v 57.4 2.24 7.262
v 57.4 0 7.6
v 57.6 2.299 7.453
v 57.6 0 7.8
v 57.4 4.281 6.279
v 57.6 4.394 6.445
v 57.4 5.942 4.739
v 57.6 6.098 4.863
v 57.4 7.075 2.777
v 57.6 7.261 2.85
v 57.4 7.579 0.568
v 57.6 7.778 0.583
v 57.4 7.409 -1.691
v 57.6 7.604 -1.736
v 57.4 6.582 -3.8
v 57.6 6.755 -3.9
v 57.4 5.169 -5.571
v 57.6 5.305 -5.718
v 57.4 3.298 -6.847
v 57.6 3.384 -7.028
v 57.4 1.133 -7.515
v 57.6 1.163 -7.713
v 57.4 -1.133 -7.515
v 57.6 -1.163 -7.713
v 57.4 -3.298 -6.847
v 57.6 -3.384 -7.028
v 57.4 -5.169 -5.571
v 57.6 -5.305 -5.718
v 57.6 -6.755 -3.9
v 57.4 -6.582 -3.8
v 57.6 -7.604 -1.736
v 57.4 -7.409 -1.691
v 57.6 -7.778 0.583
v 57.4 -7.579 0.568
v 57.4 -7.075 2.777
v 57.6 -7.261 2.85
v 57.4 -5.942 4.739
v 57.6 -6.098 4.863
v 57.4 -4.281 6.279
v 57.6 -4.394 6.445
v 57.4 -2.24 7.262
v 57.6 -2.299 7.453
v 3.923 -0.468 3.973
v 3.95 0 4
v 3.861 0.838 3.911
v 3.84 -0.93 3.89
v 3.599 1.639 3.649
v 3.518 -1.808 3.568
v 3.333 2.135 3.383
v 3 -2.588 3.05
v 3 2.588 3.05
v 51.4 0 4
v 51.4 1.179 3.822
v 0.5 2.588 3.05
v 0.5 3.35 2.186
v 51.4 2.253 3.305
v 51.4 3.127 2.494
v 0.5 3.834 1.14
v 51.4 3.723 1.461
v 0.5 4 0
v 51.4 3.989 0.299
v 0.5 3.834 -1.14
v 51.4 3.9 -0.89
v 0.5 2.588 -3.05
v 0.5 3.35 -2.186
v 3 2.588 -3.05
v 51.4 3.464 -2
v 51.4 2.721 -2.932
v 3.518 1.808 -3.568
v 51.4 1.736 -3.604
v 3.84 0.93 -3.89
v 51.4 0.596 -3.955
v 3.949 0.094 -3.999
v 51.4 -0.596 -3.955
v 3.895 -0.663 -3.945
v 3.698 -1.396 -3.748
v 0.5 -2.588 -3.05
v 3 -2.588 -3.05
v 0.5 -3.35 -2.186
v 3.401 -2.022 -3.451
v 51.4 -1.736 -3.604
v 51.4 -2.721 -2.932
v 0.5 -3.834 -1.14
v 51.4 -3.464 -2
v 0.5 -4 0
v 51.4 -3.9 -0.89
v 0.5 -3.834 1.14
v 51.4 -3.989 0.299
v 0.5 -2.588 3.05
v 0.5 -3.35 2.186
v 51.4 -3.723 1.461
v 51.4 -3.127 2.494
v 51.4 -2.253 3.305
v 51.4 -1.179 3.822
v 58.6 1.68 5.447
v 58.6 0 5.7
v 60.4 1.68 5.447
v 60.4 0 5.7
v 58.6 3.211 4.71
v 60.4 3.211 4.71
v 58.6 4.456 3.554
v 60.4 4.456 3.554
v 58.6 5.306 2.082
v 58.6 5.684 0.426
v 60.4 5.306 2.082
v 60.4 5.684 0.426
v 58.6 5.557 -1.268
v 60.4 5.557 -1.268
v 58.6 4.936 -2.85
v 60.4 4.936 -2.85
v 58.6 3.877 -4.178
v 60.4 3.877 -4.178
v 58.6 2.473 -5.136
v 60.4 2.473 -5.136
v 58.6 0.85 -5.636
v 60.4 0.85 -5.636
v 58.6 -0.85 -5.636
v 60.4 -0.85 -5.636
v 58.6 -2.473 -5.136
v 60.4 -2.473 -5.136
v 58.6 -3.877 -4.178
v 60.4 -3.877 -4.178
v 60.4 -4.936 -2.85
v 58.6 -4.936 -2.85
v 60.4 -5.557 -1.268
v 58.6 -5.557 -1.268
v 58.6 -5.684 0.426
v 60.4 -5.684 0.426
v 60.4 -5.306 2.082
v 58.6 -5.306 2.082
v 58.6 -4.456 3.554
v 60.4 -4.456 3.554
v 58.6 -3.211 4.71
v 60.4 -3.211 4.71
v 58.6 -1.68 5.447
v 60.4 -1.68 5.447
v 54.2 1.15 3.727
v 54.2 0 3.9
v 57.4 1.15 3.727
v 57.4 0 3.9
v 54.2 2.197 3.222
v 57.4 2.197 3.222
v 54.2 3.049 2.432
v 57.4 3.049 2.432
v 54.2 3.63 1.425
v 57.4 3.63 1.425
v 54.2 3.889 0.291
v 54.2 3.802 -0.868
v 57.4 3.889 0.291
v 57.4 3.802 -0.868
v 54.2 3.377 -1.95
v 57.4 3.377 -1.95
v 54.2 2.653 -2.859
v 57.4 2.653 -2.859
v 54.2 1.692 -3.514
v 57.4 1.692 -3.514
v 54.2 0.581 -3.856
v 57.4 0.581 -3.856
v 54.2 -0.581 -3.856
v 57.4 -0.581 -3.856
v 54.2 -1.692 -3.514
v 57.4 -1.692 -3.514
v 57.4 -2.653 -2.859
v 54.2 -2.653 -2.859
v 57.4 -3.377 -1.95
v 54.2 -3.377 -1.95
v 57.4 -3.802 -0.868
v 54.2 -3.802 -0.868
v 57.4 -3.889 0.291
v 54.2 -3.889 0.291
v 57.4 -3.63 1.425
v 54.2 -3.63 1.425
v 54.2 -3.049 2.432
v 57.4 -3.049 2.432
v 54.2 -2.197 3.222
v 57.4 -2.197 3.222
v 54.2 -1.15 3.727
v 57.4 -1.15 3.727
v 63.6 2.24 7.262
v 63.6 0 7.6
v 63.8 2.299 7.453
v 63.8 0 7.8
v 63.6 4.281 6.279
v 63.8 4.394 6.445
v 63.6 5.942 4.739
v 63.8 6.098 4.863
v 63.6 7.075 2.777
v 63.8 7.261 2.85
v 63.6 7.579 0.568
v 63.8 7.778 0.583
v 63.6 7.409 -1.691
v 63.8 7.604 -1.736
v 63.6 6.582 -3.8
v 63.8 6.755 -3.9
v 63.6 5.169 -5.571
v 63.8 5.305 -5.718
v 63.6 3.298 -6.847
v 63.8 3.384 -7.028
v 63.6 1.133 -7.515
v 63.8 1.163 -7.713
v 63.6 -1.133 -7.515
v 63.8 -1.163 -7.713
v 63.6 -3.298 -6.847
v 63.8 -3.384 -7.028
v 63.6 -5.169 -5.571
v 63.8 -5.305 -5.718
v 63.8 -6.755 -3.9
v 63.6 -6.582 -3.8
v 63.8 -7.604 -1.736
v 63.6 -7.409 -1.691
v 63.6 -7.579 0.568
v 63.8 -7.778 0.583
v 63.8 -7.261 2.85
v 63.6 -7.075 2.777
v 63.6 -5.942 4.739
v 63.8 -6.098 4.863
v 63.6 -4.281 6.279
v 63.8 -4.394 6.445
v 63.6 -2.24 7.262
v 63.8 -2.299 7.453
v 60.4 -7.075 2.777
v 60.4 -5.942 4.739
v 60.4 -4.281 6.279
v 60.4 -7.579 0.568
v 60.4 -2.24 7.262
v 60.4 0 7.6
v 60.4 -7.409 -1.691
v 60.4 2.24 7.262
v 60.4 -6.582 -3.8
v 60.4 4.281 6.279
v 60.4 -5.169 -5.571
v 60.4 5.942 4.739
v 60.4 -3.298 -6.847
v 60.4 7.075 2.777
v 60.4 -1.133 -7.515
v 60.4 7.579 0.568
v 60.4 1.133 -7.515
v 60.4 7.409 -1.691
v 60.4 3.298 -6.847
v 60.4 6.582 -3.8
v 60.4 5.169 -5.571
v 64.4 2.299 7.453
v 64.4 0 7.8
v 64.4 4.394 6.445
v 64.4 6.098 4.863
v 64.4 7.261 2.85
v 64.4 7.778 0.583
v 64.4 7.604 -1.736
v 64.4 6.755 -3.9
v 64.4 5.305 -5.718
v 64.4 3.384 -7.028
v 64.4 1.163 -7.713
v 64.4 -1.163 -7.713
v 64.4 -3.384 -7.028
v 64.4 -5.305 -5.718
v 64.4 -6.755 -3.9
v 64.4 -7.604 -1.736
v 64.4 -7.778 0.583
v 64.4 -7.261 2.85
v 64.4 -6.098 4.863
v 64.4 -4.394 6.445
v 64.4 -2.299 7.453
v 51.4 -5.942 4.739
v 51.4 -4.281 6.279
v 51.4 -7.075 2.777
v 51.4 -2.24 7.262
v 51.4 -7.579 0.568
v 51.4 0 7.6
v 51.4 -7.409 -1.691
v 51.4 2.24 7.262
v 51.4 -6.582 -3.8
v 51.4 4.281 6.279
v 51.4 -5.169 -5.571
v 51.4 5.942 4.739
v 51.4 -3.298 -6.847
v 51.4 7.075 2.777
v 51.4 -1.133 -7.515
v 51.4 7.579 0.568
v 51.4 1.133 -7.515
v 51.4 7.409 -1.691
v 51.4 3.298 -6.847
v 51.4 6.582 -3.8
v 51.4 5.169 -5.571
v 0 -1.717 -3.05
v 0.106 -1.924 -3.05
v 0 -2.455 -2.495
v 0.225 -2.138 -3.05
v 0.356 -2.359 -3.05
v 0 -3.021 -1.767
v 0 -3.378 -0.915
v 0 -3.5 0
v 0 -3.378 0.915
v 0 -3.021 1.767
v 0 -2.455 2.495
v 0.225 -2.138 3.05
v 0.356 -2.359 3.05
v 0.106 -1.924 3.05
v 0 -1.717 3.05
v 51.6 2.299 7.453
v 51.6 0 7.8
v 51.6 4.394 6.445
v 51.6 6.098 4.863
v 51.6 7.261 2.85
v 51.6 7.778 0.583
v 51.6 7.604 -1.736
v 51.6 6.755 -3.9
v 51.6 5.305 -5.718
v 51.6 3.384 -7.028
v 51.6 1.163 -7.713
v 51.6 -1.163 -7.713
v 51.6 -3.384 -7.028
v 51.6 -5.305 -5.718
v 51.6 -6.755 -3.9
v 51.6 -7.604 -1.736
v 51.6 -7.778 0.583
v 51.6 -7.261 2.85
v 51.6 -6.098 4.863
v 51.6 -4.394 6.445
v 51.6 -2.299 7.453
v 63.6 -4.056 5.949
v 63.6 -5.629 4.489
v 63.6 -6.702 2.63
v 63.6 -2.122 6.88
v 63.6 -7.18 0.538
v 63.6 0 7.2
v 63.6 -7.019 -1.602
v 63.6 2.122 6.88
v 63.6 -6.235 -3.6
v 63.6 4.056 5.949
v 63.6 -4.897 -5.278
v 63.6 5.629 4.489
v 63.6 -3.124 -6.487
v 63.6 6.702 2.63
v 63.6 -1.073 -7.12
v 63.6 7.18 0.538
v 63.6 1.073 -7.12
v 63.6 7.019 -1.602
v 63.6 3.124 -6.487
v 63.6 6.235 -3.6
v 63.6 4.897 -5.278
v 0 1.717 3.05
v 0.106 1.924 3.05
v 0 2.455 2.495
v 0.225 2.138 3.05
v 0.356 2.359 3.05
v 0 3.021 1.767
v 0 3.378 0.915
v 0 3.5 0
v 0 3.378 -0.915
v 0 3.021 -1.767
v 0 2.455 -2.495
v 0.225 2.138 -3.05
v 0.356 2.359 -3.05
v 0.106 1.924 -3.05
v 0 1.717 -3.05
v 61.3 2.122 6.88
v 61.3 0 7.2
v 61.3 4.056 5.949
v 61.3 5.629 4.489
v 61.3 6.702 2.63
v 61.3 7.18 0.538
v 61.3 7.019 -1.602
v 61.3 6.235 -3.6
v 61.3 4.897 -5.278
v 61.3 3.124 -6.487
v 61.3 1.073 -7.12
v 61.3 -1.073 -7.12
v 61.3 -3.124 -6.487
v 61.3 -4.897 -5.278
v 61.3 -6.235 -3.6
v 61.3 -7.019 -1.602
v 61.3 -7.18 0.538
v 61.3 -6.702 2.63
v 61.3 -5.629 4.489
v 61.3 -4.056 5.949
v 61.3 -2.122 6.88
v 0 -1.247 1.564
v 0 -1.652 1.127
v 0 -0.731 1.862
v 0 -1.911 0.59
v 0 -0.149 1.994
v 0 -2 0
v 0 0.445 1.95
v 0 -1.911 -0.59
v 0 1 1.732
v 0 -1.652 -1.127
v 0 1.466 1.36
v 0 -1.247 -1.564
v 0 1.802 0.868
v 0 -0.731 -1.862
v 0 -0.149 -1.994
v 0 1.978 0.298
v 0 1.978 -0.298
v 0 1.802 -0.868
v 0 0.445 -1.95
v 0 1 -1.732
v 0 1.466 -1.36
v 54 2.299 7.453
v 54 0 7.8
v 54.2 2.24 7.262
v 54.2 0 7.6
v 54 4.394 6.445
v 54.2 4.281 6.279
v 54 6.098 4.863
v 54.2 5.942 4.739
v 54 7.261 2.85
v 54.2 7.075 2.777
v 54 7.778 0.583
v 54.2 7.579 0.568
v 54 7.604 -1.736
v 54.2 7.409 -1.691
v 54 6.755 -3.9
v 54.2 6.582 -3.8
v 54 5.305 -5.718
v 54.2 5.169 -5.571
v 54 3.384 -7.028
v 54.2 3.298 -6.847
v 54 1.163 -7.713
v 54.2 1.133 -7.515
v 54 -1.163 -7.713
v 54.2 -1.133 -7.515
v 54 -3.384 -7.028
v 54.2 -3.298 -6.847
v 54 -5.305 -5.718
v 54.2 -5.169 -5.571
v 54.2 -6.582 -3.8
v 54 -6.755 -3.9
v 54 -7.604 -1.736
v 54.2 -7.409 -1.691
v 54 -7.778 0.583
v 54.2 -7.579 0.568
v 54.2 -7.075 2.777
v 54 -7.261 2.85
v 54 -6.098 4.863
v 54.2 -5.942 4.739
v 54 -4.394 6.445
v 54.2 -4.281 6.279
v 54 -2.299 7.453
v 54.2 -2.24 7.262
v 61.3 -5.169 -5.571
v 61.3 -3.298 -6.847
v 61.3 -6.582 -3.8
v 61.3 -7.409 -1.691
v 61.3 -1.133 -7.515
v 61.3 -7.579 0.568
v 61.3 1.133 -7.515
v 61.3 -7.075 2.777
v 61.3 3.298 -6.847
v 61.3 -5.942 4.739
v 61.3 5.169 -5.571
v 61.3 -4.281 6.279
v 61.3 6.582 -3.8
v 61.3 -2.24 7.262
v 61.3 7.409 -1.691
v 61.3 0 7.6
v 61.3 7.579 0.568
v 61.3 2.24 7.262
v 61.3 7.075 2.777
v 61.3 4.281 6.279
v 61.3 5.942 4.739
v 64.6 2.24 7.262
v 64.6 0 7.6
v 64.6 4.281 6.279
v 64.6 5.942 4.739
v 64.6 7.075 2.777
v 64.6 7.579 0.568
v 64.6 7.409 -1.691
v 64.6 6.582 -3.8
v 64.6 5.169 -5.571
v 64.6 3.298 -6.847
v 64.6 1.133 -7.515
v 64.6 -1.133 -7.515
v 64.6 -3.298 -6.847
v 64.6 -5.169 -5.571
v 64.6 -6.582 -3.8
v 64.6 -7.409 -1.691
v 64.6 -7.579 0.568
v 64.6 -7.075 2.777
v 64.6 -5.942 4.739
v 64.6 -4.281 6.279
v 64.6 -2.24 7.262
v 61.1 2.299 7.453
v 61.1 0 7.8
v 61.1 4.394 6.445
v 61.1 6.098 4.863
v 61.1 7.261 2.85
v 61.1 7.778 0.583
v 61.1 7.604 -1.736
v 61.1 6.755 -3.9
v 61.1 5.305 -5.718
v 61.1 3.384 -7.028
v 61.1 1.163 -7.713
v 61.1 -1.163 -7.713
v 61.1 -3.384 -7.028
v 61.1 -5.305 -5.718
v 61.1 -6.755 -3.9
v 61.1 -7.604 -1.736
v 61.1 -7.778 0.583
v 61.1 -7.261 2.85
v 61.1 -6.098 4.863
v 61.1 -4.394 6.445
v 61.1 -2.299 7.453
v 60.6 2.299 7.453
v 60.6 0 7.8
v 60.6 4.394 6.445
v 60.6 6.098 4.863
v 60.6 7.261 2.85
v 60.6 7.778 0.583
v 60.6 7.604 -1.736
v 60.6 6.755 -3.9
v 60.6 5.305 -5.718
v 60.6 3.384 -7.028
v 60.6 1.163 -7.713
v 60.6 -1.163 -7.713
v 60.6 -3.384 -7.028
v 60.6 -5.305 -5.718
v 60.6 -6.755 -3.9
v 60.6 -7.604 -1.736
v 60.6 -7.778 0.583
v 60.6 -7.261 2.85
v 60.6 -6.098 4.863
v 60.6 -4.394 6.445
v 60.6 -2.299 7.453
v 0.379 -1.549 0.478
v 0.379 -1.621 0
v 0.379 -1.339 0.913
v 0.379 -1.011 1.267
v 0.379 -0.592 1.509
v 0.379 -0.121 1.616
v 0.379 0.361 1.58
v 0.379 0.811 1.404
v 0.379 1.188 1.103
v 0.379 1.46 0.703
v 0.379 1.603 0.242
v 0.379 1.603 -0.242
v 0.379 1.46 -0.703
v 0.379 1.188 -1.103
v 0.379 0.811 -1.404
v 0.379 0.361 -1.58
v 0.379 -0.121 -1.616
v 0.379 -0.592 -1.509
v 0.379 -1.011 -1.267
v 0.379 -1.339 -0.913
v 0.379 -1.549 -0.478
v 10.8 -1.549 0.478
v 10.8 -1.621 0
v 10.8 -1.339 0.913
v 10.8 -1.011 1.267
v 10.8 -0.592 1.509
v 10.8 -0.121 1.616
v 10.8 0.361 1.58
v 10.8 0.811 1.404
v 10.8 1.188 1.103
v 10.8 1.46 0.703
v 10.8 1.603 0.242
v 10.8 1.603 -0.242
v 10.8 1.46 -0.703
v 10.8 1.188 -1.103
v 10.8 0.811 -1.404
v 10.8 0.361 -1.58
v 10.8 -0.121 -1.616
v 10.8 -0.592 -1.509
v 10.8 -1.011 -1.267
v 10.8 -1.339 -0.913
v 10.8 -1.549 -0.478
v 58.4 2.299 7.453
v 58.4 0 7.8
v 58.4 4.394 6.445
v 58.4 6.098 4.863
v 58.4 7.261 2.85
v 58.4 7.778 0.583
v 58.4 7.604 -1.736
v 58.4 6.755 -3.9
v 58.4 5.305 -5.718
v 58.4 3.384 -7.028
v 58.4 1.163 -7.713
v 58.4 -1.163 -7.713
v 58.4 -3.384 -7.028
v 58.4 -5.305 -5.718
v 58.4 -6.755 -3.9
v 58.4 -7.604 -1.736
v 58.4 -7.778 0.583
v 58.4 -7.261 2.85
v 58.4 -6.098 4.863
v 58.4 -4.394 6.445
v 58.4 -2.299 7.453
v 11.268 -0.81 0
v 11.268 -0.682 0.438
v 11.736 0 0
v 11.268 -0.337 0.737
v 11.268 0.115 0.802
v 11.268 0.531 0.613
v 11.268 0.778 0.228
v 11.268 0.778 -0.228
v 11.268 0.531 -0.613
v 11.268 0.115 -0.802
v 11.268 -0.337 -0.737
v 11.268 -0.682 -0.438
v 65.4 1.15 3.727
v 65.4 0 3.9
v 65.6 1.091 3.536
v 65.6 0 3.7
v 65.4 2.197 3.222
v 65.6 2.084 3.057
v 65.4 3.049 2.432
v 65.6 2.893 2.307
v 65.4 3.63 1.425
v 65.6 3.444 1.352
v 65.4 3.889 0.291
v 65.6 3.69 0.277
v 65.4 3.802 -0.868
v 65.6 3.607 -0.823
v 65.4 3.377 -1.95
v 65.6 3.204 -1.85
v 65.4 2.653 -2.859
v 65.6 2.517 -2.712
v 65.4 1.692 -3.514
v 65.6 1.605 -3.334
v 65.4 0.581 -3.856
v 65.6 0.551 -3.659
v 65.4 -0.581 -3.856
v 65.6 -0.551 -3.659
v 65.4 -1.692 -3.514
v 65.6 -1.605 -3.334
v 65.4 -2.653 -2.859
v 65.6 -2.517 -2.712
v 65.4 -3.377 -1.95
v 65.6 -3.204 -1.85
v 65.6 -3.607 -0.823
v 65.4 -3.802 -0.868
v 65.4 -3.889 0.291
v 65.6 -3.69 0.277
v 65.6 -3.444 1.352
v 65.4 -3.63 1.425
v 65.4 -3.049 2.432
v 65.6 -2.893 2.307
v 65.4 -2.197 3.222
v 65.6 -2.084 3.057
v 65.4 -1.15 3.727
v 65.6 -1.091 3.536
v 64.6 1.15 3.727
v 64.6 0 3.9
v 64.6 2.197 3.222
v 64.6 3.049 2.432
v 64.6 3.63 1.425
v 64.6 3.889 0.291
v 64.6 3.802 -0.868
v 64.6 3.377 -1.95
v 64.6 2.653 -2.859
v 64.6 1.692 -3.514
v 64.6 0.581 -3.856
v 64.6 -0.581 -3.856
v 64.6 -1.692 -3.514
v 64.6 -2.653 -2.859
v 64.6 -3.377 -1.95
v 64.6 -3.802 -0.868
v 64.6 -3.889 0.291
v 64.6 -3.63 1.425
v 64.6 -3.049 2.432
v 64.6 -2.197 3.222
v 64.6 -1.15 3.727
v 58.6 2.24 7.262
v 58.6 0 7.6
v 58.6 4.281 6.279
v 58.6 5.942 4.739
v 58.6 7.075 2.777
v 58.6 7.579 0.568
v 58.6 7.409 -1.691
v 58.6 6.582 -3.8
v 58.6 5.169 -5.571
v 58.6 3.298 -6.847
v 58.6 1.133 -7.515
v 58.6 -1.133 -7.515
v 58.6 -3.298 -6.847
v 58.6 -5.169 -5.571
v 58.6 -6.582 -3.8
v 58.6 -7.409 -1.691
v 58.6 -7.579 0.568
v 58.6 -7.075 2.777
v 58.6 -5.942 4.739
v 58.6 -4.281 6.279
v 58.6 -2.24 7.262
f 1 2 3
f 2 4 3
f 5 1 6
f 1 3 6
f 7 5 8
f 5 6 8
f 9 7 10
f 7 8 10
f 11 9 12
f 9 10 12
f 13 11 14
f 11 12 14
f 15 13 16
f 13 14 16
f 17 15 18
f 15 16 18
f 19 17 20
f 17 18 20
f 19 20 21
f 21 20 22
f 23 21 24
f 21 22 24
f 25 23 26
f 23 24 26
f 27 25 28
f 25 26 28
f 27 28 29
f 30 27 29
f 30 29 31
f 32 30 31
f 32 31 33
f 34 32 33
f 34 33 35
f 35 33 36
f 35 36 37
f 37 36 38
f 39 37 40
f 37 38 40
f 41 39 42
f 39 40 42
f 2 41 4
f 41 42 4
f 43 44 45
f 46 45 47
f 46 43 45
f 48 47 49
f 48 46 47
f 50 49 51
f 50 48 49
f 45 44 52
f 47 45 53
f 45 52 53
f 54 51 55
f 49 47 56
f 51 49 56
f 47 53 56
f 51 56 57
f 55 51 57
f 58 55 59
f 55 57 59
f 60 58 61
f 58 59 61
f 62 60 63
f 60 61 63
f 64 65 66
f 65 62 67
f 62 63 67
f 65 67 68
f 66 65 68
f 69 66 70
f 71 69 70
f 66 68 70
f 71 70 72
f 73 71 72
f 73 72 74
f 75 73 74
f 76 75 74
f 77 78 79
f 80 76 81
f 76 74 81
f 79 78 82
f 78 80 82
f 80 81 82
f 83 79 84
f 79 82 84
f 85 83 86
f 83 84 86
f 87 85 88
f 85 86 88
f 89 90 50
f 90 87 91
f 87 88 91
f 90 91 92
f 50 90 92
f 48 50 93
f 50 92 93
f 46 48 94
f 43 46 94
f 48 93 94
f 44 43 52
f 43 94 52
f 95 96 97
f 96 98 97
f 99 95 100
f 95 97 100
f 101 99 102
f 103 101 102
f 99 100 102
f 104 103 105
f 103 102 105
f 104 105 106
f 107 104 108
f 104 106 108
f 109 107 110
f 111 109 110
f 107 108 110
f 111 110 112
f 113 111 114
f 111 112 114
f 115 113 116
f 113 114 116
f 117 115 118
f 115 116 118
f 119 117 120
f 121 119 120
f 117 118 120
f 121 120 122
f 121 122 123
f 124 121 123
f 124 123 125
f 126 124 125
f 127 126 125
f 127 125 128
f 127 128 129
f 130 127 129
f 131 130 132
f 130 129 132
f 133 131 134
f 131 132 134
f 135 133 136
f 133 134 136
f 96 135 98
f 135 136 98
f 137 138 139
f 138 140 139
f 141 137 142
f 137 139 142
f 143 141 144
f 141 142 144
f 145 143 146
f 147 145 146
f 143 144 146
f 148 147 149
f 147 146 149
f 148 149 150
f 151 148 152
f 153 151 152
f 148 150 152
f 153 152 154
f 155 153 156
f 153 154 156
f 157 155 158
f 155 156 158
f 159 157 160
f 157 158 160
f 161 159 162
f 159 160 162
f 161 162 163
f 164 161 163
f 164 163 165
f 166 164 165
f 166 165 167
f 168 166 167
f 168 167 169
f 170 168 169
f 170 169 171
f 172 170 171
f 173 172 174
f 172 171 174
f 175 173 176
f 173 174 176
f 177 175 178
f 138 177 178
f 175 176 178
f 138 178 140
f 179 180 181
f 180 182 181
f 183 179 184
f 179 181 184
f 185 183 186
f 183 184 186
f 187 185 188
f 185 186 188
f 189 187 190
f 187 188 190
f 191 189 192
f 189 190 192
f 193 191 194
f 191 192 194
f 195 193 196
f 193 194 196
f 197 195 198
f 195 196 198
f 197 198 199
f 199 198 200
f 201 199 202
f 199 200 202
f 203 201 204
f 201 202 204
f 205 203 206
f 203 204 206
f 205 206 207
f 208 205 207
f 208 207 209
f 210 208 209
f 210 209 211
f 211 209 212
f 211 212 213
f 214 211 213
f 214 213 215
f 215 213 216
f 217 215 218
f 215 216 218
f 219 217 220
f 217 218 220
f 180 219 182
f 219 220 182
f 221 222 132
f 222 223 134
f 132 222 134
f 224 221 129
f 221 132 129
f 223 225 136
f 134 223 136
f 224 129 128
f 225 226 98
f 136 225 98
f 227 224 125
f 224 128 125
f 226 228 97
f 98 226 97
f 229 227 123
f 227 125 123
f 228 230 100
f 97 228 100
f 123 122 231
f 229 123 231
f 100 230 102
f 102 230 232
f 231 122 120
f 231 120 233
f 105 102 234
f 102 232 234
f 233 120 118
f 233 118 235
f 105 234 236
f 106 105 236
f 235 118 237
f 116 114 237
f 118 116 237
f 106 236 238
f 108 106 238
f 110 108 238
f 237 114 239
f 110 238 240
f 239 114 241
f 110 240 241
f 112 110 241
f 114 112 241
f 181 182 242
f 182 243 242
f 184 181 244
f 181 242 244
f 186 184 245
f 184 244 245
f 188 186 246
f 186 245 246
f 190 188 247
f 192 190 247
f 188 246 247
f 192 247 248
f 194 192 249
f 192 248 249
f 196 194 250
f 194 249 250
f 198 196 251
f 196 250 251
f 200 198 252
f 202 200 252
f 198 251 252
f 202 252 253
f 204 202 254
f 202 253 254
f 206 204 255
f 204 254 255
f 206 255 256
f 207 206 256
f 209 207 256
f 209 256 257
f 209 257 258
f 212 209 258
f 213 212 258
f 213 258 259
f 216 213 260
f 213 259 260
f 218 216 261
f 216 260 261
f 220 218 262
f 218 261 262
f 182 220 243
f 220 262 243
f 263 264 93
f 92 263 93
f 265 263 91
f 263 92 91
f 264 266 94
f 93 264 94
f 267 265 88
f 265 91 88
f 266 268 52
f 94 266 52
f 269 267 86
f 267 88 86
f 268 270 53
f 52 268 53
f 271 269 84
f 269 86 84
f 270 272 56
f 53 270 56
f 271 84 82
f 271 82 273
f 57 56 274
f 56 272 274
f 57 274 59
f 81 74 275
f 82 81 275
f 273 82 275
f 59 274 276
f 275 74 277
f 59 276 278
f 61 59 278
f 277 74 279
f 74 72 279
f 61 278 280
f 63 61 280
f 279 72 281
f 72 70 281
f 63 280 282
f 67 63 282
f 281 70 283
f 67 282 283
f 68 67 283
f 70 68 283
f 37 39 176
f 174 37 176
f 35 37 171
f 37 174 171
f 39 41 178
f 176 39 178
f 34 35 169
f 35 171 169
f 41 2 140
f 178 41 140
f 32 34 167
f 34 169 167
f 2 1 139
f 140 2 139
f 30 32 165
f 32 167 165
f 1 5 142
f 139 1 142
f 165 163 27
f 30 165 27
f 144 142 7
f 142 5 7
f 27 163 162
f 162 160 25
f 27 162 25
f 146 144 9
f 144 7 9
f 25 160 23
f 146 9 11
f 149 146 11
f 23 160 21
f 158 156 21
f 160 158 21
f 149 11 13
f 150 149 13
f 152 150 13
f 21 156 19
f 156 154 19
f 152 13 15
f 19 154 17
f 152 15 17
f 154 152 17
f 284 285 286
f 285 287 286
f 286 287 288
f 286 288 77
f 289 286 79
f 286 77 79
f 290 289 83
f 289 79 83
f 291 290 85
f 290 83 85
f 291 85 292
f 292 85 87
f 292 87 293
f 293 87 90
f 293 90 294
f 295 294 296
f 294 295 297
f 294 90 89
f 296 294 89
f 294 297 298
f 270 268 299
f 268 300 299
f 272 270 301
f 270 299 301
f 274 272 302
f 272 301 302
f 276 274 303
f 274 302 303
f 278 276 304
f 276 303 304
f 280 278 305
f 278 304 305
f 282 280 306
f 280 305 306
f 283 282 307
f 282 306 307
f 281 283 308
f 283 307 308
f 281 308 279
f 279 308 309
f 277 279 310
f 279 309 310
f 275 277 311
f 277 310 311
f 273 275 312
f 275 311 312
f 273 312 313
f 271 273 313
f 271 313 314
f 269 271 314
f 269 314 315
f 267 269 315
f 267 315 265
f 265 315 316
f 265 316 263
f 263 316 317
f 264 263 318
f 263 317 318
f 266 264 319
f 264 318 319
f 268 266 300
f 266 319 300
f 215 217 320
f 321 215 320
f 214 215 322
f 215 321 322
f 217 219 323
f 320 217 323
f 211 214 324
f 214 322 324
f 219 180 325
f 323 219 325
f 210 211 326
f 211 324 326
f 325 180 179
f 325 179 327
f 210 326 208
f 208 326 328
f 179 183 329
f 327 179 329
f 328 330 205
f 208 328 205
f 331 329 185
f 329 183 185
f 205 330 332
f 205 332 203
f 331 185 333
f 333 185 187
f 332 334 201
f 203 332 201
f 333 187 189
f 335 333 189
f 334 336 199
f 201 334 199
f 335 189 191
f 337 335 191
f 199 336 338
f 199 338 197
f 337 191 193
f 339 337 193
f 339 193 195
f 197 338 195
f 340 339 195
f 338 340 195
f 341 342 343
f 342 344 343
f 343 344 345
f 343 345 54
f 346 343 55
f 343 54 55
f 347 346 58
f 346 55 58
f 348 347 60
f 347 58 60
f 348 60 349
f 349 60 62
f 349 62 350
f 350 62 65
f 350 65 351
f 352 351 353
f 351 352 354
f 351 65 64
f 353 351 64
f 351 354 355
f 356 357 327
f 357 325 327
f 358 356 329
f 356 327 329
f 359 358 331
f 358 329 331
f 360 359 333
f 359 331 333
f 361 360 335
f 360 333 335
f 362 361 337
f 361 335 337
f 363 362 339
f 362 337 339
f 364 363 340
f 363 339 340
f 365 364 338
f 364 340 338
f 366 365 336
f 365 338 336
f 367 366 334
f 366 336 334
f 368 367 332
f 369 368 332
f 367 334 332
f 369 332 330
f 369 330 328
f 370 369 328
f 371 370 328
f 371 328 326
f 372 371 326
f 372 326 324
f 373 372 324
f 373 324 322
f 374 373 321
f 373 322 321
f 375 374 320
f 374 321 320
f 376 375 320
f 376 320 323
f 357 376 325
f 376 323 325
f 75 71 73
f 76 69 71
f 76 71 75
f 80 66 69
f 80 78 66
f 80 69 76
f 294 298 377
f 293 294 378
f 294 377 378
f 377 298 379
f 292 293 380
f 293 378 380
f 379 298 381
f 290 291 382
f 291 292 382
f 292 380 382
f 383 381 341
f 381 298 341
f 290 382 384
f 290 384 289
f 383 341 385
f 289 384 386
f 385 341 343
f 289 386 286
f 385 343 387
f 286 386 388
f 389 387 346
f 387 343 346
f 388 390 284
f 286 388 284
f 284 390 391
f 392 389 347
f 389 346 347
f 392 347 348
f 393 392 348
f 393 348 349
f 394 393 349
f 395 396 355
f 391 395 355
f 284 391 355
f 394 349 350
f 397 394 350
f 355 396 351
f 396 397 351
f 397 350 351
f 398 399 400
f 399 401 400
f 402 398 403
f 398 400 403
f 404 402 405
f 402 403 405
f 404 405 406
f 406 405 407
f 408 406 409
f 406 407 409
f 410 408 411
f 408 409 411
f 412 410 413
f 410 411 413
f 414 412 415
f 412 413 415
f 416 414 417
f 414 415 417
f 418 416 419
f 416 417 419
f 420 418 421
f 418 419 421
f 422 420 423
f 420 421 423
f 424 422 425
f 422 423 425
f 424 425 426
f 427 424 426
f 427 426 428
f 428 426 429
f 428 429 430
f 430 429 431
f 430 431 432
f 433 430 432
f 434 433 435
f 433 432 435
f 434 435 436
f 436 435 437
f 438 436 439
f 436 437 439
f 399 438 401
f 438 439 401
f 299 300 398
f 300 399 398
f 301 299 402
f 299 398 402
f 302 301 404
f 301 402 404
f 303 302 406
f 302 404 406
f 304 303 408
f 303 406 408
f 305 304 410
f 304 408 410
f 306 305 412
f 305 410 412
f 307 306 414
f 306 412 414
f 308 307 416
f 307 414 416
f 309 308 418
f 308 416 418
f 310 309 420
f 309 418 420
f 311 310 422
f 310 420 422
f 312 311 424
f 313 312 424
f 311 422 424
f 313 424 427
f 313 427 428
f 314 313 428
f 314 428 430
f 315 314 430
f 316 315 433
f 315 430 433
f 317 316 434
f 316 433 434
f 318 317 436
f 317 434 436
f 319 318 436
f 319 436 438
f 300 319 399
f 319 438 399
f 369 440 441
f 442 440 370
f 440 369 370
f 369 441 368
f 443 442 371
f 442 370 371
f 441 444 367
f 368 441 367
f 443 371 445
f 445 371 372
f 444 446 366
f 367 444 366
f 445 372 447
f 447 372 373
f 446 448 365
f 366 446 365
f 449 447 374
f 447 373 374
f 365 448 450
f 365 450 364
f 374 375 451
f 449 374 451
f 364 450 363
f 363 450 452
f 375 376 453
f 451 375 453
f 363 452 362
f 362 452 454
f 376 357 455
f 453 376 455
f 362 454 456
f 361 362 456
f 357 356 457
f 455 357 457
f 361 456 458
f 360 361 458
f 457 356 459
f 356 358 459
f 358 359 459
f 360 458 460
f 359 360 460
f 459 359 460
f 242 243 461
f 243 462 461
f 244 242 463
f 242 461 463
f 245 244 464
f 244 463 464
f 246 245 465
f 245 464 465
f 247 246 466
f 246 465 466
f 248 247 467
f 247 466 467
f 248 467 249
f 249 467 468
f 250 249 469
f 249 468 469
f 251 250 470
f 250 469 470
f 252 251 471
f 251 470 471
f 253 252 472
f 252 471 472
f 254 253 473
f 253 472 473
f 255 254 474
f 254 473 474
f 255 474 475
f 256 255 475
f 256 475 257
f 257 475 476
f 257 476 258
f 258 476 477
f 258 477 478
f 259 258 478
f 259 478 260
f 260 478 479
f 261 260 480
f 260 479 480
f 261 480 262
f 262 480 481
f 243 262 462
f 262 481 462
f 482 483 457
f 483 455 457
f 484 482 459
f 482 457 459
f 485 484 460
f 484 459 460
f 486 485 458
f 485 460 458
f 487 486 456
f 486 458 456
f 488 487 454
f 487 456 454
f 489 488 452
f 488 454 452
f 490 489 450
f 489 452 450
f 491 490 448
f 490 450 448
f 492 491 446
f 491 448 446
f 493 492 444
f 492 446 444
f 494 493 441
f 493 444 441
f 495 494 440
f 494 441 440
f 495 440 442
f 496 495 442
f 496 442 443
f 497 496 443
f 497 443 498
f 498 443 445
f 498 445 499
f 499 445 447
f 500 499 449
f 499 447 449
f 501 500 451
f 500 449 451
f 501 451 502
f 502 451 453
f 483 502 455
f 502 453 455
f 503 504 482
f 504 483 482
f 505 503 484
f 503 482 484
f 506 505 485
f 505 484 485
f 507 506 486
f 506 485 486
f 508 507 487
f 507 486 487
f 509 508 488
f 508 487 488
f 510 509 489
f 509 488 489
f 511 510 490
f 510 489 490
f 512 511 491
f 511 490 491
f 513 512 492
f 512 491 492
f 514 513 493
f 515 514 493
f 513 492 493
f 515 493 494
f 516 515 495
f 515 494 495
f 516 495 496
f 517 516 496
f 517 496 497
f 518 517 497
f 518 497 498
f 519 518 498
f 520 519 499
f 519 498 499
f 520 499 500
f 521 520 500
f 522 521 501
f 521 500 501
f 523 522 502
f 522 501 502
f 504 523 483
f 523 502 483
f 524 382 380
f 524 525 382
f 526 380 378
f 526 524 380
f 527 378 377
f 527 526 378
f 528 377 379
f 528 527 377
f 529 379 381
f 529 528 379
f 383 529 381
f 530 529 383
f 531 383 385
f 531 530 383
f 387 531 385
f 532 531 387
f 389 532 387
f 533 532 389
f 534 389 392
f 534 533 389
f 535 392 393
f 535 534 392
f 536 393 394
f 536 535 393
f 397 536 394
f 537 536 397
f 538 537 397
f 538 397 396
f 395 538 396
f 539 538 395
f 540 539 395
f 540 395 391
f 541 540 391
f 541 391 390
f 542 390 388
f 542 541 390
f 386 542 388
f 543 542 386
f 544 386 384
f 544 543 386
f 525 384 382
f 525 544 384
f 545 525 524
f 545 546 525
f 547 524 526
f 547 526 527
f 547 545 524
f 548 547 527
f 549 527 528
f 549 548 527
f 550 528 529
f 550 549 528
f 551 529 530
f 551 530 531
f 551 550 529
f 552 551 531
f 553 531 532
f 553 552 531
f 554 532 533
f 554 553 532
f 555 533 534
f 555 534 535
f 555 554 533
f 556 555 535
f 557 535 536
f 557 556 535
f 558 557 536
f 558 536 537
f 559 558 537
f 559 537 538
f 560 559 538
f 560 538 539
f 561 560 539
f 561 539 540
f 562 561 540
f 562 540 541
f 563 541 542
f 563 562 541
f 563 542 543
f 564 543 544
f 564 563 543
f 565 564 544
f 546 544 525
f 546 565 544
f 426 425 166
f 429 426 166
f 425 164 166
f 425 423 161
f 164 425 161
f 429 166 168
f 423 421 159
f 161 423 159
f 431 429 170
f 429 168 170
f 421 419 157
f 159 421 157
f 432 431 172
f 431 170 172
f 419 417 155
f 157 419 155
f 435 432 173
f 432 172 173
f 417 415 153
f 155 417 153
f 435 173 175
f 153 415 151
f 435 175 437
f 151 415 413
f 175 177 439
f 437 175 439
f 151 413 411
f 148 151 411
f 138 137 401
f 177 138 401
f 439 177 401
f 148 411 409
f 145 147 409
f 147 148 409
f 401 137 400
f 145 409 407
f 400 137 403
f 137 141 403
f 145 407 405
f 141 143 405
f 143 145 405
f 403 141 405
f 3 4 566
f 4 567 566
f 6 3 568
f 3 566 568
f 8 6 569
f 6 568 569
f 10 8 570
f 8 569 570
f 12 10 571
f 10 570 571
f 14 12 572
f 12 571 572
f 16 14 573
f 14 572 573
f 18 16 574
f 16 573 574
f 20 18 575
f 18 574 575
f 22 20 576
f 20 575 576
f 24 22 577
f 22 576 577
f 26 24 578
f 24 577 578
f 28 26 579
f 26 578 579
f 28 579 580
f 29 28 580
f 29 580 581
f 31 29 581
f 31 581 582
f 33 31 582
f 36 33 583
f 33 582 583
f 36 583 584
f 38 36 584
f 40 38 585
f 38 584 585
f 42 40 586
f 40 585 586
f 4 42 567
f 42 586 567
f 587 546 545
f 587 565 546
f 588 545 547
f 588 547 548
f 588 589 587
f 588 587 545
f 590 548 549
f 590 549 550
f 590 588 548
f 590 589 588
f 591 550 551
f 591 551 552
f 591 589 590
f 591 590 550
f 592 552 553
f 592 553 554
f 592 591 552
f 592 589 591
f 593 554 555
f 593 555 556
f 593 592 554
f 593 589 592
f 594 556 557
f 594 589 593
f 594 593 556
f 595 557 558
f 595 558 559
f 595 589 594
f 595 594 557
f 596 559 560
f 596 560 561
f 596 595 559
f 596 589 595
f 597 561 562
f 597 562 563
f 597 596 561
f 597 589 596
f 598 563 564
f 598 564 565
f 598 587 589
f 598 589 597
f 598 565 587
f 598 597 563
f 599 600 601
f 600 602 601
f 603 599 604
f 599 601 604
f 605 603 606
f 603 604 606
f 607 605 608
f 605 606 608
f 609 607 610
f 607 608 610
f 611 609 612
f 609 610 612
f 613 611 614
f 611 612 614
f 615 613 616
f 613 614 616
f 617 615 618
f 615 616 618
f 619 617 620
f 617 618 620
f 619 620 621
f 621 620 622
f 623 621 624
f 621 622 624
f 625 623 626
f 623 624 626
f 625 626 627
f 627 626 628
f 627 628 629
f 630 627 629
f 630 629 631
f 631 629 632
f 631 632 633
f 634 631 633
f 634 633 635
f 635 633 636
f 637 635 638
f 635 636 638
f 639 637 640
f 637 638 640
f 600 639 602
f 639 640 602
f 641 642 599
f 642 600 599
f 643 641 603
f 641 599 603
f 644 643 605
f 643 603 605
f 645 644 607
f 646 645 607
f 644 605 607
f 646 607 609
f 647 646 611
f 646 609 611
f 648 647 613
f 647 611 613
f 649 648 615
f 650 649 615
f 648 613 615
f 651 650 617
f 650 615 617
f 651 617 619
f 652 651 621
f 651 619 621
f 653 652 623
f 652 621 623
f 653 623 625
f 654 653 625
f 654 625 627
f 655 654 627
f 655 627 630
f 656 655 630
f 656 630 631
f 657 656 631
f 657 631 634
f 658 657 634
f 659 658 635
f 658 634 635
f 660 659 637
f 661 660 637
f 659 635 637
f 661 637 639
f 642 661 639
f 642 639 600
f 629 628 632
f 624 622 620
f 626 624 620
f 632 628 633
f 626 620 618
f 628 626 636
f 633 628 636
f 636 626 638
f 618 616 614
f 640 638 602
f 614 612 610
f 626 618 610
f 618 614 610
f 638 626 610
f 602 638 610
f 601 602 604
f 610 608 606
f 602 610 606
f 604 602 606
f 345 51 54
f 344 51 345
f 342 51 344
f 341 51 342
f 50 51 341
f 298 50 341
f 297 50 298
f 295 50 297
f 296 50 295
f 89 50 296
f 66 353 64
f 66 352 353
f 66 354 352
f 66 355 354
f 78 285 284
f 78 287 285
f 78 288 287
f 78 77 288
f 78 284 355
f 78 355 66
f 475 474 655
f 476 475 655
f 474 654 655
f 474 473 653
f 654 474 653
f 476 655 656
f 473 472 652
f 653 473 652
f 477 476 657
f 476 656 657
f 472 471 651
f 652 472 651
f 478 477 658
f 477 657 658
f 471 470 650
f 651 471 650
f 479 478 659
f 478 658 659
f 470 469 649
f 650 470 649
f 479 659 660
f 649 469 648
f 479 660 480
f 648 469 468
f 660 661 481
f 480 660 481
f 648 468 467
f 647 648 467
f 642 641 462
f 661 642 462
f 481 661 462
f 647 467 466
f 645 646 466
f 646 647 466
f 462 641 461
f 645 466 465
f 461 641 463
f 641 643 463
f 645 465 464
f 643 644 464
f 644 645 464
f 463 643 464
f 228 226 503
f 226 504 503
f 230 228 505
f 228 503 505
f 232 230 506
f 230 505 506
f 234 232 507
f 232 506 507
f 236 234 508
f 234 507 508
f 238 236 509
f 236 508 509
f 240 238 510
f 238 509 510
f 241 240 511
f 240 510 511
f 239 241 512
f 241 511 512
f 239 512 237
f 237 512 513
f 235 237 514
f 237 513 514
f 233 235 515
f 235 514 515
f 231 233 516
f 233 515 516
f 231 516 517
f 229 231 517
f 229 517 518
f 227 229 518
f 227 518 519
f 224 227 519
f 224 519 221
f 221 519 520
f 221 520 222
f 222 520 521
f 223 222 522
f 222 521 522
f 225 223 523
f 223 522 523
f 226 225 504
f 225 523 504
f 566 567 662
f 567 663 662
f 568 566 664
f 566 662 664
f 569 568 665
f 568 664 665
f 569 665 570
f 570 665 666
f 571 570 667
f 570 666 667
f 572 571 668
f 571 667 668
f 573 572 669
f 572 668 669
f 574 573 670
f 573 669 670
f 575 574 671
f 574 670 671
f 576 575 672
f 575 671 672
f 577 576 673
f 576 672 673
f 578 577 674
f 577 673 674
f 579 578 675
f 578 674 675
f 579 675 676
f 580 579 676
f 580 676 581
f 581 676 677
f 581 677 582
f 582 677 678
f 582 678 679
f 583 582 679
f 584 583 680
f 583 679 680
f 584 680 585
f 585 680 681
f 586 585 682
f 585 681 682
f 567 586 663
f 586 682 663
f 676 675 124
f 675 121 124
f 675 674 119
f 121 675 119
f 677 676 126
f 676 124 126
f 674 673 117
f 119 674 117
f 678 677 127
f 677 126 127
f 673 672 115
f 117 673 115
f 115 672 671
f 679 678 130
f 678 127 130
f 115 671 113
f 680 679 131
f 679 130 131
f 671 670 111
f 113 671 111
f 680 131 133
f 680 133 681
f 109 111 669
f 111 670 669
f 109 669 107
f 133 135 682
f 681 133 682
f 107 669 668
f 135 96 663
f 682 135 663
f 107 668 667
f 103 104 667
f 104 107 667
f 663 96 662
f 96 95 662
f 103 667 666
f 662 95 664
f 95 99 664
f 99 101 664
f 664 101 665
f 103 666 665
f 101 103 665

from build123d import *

# Parameters (mm, degrees)
CUT_EXTRUDE_1_DEPTH      = 8
CUT_EXTRUDE_1_DEPTH_BACK = 8


with BuildPart() as part:
    # 草图1 → 旋转1 (revolve)
    with BuildSketch(Plane.XY):
        Polygon((0, 0), (0, 3.5), (0.5, 4), (51.4, 4), (51.4, 7.6), (51.6, 7.8), (54, 7.8), (54.2, 7.6), (54.2, 3.9), (57.4, 3.9), (57.4, 7.6), (57.6, 7.8), (58.4, 7.8), (58.6, 7.6), (58.6, 5.7), (60.4, 5.7), (60.4, 7.6), (60.6, 7.8), (61.1, 7.8), (61.3, 7.6), (61.3, 7.2), (63.6, 7.2), (63.6, 7.6), (63.8, 7.8), (64.4, 7.8), (64.6, 7.6), (64.6, 3.9), (65.4, 3.9), (65.6, 3.7), (65.6, 0), align=None)
    revolve(axis=Axis((65.6, 0, 0), (-1, 0, 0)))

    # 草图2 → 切除-旋转1 (revolve, cut)
    with BuildSketch(Plane.XY):
        Polygon((0, 0), (0, 2), (0.379, 1.621), (10.8, 1.621), (11.735884786, 0), align=None)
    revolve(axis=Axis((11.735884786, 0, 0), (-1, 0, 0)), mode=Mode.SUBTRACT)

    # 草图3 → 切除-拉伸1 (cut, two sides: drawn at the far end of the back side and taken through both)
    with BuildSketch(Plane(origin=(0, 0, 0), x_dir=(1, 0, 0), z_dir=(0, 1, 0)).offset(-CUT_EXTRUDE_1_DEPTH_BACK)):
        Polygon((-9.2, -10.121067812), (10.071067812, -10.121067812), (3, -3.05), (0, -3.05), (0, 3.05), (3, 3.05), (10.071067812, 10.121067812), (-9.2, 10.121067812), align=None)
    extrude(amount=CUT_EXTRUDE_1_DEPTH + CUT_EXTRUDE_1_DEPTH_BACK, mode=Mode.SUBTRACT)


solid = part.part
